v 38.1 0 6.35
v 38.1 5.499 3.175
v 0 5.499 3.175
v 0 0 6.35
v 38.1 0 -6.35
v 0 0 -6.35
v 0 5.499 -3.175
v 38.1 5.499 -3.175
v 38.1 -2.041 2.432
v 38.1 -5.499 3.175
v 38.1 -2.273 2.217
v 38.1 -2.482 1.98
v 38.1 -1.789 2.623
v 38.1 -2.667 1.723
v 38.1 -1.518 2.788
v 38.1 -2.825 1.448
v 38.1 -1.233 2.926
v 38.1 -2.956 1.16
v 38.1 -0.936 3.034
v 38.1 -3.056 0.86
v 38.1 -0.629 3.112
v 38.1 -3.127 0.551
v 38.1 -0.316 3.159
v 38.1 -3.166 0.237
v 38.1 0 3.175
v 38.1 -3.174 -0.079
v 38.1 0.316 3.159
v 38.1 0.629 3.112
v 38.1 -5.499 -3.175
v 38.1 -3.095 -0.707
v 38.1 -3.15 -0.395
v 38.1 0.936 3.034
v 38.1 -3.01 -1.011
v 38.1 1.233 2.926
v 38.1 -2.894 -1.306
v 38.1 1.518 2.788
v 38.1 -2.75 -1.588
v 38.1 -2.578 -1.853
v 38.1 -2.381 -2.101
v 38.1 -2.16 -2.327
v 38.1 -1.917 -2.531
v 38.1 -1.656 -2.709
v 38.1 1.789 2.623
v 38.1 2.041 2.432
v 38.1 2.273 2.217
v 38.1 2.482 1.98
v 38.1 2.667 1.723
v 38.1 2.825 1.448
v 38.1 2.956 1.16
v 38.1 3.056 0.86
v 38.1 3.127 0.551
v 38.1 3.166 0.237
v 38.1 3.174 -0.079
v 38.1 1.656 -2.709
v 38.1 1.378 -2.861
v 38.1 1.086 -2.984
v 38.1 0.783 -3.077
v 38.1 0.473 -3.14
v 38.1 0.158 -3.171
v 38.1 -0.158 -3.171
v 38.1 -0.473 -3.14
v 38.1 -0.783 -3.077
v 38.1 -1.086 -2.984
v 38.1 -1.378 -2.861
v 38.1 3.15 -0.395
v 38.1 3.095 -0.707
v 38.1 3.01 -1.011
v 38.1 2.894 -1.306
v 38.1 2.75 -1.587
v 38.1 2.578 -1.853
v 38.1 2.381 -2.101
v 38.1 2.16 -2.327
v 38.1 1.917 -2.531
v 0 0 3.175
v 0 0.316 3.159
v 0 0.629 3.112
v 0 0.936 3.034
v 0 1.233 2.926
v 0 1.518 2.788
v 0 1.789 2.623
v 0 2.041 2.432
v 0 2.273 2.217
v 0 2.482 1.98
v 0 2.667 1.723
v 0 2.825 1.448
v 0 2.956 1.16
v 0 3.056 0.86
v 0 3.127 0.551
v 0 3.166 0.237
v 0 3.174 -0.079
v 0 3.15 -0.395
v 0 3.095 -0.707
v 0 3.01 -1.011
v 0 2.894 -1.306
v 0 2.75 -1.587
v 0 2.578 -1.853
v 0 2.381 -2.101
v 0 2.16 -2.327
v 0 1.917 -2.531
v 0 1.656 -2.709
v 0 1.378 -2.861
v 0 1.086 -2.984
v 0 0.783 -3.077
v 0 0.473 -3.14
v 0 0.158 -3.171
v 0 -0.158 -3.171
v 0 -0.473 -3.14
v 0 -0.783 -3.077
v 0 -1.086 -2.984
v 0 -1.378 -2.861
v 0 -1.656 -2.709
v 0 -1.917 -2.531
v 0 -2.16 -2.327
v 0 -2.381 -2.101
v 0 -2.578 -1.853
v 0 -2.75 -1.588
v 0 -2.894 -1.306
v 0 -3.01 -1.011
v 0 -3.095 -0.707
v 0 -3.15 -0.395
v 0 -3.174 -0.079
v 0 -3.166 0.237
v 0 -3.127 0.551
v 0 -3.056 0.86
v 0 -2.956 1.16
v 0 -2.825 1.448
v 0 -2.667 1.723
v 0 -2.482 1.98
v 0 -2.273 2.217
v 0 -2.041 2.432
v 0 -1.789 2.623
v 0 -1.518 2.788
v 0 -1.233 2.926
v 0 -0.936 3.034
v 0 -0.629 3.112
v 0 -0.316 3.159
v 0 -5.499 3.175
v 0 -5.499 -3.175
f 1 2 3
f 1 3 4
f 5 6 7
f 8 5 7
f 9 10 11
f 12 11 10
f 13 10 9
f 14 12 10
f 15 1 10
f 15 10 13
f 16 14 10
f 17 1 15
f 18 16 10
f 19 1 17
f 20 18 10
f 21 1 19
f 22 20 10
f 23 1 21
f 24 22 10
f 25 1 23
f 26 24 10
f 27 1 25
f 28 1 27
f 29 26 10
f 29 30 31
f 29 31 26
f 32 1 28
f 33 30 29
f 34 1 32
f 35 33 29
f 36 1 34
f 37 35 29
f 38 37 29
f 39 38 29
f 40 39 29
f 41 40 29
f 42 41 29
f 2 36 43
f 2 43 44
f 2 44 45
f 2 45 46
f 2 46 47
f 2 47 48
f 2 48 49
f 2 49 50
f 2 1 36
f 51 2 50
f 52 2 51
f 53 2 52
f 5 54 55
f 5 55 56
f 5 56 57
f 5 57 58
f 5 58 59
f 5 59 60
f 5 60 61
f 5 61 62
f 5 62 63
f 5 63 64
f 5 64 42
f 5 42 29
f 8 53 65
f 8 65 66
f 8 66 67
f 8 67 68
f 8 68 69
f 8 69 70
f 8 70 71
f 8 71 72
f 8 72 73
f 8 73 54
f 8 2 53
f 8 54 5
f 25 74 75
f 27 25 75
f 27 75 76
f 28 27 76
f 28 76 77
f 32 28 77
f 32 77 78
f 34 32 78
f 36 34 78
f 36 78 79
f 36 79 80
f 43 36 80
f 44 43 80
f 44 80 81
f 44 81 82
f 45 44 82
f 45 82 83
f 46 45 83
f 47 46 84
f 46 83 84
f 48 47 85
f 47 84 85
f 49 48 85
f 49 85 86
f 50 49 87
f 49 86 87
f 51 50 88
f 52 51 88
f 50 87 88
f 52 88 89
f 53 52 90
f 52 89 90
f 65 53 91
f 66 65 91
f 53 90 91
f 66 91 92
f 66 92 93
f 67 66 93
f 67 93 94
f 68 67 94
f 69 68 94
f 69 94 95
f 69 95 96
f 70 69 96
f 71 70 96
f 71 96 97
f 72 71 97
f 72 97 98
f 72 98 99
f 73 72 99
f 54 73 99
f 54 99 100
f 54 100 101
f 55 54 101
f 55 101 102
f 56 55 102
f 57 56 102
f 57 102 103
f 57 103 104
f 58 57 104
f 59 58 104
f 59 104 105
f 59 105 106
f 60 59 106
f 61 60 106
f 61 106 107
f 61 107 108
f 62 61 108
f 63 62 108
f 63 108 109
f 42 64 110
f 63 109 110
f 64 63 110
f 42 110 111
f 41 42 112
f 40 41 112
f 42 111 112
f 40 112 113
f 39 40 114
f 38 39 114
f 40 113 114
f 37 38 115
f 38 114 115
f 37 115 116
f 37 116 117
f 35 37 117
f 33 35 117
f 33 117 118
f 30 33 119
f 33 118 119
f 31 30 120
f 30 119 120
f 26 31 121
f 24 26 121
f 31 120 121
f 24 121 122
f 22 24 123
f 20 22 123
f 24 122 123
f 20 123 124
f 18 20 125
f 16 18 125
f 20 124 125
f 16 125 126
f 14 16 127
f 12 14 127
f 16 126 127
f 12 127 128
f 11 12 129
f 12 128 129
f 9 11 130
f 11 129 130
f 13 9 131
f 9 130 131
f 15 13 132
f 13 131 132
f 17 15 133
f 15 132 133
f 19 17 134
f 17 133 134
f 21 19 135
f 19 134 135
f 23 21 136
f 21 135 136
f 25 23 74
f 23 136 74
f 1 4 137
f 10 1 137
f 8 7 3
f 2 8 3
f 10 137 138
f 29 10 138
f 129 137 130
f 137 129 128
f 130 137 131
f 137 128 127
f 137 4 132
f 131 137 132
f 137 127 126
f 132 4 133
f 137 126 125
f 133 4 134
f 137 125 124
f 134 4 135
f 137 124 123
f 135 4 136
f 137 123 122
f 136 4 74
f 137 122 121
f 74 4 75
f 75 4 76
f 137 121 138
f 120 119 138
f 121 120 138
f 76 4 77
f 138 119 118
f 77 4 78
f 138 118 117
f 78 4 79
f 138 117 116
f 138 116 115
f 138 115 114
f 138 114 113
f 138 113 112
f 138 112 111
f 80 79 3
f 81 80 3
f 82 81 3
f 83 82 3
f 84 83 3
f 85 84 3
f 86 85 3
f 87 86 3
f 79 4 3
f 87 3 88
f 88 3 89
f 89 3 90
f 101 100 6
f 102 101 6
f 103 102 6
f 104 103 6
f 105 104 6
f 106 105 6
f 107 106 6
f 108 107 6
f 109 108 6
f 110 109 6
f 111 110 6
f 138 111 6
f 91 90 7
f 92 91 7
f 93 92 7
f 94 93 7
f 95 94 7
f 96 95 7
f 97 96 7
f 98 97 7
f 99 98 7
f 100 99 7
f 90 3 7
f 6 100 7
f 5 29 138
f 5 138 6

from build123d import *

# Parameters (mm, degrees)
BOSS_EXTRUDE1_DEPTH = 38.1
SKETCH2_R           = 3.175
CUT_EXTRUDE1_DEPTH  = 39.1


with BuildPart() as part:
    # Sketch1 → Boss-Extrude1 (new body)
    with BuildSketch(Plane(origin=(0, 0, 0), x_dir=(0, 0, -1), z_dir=(1, 0, 0))):
        Polygon((6.35, -1.3864e-05), (3.175012007, 5.499254382), (-3.174987993, 5.499268246), (-6.35, 1.3864e-05), (-3.175012007, -5.499254382), (3.174987993, -5.499268246), align=None)
    extrude(amount=BOSS_EXTRUDE1_DEPTH)

    # Sketch2 → Cut-Extrude1 (cut, through all)
    with BuildSketch(Plane.ZY):
        Circle(SKETCH2_R)
    extrude(amount=-CUT_EXTRUDE1_DEPTH, mode=Mode.SUBTRACT)


solid = part.part
